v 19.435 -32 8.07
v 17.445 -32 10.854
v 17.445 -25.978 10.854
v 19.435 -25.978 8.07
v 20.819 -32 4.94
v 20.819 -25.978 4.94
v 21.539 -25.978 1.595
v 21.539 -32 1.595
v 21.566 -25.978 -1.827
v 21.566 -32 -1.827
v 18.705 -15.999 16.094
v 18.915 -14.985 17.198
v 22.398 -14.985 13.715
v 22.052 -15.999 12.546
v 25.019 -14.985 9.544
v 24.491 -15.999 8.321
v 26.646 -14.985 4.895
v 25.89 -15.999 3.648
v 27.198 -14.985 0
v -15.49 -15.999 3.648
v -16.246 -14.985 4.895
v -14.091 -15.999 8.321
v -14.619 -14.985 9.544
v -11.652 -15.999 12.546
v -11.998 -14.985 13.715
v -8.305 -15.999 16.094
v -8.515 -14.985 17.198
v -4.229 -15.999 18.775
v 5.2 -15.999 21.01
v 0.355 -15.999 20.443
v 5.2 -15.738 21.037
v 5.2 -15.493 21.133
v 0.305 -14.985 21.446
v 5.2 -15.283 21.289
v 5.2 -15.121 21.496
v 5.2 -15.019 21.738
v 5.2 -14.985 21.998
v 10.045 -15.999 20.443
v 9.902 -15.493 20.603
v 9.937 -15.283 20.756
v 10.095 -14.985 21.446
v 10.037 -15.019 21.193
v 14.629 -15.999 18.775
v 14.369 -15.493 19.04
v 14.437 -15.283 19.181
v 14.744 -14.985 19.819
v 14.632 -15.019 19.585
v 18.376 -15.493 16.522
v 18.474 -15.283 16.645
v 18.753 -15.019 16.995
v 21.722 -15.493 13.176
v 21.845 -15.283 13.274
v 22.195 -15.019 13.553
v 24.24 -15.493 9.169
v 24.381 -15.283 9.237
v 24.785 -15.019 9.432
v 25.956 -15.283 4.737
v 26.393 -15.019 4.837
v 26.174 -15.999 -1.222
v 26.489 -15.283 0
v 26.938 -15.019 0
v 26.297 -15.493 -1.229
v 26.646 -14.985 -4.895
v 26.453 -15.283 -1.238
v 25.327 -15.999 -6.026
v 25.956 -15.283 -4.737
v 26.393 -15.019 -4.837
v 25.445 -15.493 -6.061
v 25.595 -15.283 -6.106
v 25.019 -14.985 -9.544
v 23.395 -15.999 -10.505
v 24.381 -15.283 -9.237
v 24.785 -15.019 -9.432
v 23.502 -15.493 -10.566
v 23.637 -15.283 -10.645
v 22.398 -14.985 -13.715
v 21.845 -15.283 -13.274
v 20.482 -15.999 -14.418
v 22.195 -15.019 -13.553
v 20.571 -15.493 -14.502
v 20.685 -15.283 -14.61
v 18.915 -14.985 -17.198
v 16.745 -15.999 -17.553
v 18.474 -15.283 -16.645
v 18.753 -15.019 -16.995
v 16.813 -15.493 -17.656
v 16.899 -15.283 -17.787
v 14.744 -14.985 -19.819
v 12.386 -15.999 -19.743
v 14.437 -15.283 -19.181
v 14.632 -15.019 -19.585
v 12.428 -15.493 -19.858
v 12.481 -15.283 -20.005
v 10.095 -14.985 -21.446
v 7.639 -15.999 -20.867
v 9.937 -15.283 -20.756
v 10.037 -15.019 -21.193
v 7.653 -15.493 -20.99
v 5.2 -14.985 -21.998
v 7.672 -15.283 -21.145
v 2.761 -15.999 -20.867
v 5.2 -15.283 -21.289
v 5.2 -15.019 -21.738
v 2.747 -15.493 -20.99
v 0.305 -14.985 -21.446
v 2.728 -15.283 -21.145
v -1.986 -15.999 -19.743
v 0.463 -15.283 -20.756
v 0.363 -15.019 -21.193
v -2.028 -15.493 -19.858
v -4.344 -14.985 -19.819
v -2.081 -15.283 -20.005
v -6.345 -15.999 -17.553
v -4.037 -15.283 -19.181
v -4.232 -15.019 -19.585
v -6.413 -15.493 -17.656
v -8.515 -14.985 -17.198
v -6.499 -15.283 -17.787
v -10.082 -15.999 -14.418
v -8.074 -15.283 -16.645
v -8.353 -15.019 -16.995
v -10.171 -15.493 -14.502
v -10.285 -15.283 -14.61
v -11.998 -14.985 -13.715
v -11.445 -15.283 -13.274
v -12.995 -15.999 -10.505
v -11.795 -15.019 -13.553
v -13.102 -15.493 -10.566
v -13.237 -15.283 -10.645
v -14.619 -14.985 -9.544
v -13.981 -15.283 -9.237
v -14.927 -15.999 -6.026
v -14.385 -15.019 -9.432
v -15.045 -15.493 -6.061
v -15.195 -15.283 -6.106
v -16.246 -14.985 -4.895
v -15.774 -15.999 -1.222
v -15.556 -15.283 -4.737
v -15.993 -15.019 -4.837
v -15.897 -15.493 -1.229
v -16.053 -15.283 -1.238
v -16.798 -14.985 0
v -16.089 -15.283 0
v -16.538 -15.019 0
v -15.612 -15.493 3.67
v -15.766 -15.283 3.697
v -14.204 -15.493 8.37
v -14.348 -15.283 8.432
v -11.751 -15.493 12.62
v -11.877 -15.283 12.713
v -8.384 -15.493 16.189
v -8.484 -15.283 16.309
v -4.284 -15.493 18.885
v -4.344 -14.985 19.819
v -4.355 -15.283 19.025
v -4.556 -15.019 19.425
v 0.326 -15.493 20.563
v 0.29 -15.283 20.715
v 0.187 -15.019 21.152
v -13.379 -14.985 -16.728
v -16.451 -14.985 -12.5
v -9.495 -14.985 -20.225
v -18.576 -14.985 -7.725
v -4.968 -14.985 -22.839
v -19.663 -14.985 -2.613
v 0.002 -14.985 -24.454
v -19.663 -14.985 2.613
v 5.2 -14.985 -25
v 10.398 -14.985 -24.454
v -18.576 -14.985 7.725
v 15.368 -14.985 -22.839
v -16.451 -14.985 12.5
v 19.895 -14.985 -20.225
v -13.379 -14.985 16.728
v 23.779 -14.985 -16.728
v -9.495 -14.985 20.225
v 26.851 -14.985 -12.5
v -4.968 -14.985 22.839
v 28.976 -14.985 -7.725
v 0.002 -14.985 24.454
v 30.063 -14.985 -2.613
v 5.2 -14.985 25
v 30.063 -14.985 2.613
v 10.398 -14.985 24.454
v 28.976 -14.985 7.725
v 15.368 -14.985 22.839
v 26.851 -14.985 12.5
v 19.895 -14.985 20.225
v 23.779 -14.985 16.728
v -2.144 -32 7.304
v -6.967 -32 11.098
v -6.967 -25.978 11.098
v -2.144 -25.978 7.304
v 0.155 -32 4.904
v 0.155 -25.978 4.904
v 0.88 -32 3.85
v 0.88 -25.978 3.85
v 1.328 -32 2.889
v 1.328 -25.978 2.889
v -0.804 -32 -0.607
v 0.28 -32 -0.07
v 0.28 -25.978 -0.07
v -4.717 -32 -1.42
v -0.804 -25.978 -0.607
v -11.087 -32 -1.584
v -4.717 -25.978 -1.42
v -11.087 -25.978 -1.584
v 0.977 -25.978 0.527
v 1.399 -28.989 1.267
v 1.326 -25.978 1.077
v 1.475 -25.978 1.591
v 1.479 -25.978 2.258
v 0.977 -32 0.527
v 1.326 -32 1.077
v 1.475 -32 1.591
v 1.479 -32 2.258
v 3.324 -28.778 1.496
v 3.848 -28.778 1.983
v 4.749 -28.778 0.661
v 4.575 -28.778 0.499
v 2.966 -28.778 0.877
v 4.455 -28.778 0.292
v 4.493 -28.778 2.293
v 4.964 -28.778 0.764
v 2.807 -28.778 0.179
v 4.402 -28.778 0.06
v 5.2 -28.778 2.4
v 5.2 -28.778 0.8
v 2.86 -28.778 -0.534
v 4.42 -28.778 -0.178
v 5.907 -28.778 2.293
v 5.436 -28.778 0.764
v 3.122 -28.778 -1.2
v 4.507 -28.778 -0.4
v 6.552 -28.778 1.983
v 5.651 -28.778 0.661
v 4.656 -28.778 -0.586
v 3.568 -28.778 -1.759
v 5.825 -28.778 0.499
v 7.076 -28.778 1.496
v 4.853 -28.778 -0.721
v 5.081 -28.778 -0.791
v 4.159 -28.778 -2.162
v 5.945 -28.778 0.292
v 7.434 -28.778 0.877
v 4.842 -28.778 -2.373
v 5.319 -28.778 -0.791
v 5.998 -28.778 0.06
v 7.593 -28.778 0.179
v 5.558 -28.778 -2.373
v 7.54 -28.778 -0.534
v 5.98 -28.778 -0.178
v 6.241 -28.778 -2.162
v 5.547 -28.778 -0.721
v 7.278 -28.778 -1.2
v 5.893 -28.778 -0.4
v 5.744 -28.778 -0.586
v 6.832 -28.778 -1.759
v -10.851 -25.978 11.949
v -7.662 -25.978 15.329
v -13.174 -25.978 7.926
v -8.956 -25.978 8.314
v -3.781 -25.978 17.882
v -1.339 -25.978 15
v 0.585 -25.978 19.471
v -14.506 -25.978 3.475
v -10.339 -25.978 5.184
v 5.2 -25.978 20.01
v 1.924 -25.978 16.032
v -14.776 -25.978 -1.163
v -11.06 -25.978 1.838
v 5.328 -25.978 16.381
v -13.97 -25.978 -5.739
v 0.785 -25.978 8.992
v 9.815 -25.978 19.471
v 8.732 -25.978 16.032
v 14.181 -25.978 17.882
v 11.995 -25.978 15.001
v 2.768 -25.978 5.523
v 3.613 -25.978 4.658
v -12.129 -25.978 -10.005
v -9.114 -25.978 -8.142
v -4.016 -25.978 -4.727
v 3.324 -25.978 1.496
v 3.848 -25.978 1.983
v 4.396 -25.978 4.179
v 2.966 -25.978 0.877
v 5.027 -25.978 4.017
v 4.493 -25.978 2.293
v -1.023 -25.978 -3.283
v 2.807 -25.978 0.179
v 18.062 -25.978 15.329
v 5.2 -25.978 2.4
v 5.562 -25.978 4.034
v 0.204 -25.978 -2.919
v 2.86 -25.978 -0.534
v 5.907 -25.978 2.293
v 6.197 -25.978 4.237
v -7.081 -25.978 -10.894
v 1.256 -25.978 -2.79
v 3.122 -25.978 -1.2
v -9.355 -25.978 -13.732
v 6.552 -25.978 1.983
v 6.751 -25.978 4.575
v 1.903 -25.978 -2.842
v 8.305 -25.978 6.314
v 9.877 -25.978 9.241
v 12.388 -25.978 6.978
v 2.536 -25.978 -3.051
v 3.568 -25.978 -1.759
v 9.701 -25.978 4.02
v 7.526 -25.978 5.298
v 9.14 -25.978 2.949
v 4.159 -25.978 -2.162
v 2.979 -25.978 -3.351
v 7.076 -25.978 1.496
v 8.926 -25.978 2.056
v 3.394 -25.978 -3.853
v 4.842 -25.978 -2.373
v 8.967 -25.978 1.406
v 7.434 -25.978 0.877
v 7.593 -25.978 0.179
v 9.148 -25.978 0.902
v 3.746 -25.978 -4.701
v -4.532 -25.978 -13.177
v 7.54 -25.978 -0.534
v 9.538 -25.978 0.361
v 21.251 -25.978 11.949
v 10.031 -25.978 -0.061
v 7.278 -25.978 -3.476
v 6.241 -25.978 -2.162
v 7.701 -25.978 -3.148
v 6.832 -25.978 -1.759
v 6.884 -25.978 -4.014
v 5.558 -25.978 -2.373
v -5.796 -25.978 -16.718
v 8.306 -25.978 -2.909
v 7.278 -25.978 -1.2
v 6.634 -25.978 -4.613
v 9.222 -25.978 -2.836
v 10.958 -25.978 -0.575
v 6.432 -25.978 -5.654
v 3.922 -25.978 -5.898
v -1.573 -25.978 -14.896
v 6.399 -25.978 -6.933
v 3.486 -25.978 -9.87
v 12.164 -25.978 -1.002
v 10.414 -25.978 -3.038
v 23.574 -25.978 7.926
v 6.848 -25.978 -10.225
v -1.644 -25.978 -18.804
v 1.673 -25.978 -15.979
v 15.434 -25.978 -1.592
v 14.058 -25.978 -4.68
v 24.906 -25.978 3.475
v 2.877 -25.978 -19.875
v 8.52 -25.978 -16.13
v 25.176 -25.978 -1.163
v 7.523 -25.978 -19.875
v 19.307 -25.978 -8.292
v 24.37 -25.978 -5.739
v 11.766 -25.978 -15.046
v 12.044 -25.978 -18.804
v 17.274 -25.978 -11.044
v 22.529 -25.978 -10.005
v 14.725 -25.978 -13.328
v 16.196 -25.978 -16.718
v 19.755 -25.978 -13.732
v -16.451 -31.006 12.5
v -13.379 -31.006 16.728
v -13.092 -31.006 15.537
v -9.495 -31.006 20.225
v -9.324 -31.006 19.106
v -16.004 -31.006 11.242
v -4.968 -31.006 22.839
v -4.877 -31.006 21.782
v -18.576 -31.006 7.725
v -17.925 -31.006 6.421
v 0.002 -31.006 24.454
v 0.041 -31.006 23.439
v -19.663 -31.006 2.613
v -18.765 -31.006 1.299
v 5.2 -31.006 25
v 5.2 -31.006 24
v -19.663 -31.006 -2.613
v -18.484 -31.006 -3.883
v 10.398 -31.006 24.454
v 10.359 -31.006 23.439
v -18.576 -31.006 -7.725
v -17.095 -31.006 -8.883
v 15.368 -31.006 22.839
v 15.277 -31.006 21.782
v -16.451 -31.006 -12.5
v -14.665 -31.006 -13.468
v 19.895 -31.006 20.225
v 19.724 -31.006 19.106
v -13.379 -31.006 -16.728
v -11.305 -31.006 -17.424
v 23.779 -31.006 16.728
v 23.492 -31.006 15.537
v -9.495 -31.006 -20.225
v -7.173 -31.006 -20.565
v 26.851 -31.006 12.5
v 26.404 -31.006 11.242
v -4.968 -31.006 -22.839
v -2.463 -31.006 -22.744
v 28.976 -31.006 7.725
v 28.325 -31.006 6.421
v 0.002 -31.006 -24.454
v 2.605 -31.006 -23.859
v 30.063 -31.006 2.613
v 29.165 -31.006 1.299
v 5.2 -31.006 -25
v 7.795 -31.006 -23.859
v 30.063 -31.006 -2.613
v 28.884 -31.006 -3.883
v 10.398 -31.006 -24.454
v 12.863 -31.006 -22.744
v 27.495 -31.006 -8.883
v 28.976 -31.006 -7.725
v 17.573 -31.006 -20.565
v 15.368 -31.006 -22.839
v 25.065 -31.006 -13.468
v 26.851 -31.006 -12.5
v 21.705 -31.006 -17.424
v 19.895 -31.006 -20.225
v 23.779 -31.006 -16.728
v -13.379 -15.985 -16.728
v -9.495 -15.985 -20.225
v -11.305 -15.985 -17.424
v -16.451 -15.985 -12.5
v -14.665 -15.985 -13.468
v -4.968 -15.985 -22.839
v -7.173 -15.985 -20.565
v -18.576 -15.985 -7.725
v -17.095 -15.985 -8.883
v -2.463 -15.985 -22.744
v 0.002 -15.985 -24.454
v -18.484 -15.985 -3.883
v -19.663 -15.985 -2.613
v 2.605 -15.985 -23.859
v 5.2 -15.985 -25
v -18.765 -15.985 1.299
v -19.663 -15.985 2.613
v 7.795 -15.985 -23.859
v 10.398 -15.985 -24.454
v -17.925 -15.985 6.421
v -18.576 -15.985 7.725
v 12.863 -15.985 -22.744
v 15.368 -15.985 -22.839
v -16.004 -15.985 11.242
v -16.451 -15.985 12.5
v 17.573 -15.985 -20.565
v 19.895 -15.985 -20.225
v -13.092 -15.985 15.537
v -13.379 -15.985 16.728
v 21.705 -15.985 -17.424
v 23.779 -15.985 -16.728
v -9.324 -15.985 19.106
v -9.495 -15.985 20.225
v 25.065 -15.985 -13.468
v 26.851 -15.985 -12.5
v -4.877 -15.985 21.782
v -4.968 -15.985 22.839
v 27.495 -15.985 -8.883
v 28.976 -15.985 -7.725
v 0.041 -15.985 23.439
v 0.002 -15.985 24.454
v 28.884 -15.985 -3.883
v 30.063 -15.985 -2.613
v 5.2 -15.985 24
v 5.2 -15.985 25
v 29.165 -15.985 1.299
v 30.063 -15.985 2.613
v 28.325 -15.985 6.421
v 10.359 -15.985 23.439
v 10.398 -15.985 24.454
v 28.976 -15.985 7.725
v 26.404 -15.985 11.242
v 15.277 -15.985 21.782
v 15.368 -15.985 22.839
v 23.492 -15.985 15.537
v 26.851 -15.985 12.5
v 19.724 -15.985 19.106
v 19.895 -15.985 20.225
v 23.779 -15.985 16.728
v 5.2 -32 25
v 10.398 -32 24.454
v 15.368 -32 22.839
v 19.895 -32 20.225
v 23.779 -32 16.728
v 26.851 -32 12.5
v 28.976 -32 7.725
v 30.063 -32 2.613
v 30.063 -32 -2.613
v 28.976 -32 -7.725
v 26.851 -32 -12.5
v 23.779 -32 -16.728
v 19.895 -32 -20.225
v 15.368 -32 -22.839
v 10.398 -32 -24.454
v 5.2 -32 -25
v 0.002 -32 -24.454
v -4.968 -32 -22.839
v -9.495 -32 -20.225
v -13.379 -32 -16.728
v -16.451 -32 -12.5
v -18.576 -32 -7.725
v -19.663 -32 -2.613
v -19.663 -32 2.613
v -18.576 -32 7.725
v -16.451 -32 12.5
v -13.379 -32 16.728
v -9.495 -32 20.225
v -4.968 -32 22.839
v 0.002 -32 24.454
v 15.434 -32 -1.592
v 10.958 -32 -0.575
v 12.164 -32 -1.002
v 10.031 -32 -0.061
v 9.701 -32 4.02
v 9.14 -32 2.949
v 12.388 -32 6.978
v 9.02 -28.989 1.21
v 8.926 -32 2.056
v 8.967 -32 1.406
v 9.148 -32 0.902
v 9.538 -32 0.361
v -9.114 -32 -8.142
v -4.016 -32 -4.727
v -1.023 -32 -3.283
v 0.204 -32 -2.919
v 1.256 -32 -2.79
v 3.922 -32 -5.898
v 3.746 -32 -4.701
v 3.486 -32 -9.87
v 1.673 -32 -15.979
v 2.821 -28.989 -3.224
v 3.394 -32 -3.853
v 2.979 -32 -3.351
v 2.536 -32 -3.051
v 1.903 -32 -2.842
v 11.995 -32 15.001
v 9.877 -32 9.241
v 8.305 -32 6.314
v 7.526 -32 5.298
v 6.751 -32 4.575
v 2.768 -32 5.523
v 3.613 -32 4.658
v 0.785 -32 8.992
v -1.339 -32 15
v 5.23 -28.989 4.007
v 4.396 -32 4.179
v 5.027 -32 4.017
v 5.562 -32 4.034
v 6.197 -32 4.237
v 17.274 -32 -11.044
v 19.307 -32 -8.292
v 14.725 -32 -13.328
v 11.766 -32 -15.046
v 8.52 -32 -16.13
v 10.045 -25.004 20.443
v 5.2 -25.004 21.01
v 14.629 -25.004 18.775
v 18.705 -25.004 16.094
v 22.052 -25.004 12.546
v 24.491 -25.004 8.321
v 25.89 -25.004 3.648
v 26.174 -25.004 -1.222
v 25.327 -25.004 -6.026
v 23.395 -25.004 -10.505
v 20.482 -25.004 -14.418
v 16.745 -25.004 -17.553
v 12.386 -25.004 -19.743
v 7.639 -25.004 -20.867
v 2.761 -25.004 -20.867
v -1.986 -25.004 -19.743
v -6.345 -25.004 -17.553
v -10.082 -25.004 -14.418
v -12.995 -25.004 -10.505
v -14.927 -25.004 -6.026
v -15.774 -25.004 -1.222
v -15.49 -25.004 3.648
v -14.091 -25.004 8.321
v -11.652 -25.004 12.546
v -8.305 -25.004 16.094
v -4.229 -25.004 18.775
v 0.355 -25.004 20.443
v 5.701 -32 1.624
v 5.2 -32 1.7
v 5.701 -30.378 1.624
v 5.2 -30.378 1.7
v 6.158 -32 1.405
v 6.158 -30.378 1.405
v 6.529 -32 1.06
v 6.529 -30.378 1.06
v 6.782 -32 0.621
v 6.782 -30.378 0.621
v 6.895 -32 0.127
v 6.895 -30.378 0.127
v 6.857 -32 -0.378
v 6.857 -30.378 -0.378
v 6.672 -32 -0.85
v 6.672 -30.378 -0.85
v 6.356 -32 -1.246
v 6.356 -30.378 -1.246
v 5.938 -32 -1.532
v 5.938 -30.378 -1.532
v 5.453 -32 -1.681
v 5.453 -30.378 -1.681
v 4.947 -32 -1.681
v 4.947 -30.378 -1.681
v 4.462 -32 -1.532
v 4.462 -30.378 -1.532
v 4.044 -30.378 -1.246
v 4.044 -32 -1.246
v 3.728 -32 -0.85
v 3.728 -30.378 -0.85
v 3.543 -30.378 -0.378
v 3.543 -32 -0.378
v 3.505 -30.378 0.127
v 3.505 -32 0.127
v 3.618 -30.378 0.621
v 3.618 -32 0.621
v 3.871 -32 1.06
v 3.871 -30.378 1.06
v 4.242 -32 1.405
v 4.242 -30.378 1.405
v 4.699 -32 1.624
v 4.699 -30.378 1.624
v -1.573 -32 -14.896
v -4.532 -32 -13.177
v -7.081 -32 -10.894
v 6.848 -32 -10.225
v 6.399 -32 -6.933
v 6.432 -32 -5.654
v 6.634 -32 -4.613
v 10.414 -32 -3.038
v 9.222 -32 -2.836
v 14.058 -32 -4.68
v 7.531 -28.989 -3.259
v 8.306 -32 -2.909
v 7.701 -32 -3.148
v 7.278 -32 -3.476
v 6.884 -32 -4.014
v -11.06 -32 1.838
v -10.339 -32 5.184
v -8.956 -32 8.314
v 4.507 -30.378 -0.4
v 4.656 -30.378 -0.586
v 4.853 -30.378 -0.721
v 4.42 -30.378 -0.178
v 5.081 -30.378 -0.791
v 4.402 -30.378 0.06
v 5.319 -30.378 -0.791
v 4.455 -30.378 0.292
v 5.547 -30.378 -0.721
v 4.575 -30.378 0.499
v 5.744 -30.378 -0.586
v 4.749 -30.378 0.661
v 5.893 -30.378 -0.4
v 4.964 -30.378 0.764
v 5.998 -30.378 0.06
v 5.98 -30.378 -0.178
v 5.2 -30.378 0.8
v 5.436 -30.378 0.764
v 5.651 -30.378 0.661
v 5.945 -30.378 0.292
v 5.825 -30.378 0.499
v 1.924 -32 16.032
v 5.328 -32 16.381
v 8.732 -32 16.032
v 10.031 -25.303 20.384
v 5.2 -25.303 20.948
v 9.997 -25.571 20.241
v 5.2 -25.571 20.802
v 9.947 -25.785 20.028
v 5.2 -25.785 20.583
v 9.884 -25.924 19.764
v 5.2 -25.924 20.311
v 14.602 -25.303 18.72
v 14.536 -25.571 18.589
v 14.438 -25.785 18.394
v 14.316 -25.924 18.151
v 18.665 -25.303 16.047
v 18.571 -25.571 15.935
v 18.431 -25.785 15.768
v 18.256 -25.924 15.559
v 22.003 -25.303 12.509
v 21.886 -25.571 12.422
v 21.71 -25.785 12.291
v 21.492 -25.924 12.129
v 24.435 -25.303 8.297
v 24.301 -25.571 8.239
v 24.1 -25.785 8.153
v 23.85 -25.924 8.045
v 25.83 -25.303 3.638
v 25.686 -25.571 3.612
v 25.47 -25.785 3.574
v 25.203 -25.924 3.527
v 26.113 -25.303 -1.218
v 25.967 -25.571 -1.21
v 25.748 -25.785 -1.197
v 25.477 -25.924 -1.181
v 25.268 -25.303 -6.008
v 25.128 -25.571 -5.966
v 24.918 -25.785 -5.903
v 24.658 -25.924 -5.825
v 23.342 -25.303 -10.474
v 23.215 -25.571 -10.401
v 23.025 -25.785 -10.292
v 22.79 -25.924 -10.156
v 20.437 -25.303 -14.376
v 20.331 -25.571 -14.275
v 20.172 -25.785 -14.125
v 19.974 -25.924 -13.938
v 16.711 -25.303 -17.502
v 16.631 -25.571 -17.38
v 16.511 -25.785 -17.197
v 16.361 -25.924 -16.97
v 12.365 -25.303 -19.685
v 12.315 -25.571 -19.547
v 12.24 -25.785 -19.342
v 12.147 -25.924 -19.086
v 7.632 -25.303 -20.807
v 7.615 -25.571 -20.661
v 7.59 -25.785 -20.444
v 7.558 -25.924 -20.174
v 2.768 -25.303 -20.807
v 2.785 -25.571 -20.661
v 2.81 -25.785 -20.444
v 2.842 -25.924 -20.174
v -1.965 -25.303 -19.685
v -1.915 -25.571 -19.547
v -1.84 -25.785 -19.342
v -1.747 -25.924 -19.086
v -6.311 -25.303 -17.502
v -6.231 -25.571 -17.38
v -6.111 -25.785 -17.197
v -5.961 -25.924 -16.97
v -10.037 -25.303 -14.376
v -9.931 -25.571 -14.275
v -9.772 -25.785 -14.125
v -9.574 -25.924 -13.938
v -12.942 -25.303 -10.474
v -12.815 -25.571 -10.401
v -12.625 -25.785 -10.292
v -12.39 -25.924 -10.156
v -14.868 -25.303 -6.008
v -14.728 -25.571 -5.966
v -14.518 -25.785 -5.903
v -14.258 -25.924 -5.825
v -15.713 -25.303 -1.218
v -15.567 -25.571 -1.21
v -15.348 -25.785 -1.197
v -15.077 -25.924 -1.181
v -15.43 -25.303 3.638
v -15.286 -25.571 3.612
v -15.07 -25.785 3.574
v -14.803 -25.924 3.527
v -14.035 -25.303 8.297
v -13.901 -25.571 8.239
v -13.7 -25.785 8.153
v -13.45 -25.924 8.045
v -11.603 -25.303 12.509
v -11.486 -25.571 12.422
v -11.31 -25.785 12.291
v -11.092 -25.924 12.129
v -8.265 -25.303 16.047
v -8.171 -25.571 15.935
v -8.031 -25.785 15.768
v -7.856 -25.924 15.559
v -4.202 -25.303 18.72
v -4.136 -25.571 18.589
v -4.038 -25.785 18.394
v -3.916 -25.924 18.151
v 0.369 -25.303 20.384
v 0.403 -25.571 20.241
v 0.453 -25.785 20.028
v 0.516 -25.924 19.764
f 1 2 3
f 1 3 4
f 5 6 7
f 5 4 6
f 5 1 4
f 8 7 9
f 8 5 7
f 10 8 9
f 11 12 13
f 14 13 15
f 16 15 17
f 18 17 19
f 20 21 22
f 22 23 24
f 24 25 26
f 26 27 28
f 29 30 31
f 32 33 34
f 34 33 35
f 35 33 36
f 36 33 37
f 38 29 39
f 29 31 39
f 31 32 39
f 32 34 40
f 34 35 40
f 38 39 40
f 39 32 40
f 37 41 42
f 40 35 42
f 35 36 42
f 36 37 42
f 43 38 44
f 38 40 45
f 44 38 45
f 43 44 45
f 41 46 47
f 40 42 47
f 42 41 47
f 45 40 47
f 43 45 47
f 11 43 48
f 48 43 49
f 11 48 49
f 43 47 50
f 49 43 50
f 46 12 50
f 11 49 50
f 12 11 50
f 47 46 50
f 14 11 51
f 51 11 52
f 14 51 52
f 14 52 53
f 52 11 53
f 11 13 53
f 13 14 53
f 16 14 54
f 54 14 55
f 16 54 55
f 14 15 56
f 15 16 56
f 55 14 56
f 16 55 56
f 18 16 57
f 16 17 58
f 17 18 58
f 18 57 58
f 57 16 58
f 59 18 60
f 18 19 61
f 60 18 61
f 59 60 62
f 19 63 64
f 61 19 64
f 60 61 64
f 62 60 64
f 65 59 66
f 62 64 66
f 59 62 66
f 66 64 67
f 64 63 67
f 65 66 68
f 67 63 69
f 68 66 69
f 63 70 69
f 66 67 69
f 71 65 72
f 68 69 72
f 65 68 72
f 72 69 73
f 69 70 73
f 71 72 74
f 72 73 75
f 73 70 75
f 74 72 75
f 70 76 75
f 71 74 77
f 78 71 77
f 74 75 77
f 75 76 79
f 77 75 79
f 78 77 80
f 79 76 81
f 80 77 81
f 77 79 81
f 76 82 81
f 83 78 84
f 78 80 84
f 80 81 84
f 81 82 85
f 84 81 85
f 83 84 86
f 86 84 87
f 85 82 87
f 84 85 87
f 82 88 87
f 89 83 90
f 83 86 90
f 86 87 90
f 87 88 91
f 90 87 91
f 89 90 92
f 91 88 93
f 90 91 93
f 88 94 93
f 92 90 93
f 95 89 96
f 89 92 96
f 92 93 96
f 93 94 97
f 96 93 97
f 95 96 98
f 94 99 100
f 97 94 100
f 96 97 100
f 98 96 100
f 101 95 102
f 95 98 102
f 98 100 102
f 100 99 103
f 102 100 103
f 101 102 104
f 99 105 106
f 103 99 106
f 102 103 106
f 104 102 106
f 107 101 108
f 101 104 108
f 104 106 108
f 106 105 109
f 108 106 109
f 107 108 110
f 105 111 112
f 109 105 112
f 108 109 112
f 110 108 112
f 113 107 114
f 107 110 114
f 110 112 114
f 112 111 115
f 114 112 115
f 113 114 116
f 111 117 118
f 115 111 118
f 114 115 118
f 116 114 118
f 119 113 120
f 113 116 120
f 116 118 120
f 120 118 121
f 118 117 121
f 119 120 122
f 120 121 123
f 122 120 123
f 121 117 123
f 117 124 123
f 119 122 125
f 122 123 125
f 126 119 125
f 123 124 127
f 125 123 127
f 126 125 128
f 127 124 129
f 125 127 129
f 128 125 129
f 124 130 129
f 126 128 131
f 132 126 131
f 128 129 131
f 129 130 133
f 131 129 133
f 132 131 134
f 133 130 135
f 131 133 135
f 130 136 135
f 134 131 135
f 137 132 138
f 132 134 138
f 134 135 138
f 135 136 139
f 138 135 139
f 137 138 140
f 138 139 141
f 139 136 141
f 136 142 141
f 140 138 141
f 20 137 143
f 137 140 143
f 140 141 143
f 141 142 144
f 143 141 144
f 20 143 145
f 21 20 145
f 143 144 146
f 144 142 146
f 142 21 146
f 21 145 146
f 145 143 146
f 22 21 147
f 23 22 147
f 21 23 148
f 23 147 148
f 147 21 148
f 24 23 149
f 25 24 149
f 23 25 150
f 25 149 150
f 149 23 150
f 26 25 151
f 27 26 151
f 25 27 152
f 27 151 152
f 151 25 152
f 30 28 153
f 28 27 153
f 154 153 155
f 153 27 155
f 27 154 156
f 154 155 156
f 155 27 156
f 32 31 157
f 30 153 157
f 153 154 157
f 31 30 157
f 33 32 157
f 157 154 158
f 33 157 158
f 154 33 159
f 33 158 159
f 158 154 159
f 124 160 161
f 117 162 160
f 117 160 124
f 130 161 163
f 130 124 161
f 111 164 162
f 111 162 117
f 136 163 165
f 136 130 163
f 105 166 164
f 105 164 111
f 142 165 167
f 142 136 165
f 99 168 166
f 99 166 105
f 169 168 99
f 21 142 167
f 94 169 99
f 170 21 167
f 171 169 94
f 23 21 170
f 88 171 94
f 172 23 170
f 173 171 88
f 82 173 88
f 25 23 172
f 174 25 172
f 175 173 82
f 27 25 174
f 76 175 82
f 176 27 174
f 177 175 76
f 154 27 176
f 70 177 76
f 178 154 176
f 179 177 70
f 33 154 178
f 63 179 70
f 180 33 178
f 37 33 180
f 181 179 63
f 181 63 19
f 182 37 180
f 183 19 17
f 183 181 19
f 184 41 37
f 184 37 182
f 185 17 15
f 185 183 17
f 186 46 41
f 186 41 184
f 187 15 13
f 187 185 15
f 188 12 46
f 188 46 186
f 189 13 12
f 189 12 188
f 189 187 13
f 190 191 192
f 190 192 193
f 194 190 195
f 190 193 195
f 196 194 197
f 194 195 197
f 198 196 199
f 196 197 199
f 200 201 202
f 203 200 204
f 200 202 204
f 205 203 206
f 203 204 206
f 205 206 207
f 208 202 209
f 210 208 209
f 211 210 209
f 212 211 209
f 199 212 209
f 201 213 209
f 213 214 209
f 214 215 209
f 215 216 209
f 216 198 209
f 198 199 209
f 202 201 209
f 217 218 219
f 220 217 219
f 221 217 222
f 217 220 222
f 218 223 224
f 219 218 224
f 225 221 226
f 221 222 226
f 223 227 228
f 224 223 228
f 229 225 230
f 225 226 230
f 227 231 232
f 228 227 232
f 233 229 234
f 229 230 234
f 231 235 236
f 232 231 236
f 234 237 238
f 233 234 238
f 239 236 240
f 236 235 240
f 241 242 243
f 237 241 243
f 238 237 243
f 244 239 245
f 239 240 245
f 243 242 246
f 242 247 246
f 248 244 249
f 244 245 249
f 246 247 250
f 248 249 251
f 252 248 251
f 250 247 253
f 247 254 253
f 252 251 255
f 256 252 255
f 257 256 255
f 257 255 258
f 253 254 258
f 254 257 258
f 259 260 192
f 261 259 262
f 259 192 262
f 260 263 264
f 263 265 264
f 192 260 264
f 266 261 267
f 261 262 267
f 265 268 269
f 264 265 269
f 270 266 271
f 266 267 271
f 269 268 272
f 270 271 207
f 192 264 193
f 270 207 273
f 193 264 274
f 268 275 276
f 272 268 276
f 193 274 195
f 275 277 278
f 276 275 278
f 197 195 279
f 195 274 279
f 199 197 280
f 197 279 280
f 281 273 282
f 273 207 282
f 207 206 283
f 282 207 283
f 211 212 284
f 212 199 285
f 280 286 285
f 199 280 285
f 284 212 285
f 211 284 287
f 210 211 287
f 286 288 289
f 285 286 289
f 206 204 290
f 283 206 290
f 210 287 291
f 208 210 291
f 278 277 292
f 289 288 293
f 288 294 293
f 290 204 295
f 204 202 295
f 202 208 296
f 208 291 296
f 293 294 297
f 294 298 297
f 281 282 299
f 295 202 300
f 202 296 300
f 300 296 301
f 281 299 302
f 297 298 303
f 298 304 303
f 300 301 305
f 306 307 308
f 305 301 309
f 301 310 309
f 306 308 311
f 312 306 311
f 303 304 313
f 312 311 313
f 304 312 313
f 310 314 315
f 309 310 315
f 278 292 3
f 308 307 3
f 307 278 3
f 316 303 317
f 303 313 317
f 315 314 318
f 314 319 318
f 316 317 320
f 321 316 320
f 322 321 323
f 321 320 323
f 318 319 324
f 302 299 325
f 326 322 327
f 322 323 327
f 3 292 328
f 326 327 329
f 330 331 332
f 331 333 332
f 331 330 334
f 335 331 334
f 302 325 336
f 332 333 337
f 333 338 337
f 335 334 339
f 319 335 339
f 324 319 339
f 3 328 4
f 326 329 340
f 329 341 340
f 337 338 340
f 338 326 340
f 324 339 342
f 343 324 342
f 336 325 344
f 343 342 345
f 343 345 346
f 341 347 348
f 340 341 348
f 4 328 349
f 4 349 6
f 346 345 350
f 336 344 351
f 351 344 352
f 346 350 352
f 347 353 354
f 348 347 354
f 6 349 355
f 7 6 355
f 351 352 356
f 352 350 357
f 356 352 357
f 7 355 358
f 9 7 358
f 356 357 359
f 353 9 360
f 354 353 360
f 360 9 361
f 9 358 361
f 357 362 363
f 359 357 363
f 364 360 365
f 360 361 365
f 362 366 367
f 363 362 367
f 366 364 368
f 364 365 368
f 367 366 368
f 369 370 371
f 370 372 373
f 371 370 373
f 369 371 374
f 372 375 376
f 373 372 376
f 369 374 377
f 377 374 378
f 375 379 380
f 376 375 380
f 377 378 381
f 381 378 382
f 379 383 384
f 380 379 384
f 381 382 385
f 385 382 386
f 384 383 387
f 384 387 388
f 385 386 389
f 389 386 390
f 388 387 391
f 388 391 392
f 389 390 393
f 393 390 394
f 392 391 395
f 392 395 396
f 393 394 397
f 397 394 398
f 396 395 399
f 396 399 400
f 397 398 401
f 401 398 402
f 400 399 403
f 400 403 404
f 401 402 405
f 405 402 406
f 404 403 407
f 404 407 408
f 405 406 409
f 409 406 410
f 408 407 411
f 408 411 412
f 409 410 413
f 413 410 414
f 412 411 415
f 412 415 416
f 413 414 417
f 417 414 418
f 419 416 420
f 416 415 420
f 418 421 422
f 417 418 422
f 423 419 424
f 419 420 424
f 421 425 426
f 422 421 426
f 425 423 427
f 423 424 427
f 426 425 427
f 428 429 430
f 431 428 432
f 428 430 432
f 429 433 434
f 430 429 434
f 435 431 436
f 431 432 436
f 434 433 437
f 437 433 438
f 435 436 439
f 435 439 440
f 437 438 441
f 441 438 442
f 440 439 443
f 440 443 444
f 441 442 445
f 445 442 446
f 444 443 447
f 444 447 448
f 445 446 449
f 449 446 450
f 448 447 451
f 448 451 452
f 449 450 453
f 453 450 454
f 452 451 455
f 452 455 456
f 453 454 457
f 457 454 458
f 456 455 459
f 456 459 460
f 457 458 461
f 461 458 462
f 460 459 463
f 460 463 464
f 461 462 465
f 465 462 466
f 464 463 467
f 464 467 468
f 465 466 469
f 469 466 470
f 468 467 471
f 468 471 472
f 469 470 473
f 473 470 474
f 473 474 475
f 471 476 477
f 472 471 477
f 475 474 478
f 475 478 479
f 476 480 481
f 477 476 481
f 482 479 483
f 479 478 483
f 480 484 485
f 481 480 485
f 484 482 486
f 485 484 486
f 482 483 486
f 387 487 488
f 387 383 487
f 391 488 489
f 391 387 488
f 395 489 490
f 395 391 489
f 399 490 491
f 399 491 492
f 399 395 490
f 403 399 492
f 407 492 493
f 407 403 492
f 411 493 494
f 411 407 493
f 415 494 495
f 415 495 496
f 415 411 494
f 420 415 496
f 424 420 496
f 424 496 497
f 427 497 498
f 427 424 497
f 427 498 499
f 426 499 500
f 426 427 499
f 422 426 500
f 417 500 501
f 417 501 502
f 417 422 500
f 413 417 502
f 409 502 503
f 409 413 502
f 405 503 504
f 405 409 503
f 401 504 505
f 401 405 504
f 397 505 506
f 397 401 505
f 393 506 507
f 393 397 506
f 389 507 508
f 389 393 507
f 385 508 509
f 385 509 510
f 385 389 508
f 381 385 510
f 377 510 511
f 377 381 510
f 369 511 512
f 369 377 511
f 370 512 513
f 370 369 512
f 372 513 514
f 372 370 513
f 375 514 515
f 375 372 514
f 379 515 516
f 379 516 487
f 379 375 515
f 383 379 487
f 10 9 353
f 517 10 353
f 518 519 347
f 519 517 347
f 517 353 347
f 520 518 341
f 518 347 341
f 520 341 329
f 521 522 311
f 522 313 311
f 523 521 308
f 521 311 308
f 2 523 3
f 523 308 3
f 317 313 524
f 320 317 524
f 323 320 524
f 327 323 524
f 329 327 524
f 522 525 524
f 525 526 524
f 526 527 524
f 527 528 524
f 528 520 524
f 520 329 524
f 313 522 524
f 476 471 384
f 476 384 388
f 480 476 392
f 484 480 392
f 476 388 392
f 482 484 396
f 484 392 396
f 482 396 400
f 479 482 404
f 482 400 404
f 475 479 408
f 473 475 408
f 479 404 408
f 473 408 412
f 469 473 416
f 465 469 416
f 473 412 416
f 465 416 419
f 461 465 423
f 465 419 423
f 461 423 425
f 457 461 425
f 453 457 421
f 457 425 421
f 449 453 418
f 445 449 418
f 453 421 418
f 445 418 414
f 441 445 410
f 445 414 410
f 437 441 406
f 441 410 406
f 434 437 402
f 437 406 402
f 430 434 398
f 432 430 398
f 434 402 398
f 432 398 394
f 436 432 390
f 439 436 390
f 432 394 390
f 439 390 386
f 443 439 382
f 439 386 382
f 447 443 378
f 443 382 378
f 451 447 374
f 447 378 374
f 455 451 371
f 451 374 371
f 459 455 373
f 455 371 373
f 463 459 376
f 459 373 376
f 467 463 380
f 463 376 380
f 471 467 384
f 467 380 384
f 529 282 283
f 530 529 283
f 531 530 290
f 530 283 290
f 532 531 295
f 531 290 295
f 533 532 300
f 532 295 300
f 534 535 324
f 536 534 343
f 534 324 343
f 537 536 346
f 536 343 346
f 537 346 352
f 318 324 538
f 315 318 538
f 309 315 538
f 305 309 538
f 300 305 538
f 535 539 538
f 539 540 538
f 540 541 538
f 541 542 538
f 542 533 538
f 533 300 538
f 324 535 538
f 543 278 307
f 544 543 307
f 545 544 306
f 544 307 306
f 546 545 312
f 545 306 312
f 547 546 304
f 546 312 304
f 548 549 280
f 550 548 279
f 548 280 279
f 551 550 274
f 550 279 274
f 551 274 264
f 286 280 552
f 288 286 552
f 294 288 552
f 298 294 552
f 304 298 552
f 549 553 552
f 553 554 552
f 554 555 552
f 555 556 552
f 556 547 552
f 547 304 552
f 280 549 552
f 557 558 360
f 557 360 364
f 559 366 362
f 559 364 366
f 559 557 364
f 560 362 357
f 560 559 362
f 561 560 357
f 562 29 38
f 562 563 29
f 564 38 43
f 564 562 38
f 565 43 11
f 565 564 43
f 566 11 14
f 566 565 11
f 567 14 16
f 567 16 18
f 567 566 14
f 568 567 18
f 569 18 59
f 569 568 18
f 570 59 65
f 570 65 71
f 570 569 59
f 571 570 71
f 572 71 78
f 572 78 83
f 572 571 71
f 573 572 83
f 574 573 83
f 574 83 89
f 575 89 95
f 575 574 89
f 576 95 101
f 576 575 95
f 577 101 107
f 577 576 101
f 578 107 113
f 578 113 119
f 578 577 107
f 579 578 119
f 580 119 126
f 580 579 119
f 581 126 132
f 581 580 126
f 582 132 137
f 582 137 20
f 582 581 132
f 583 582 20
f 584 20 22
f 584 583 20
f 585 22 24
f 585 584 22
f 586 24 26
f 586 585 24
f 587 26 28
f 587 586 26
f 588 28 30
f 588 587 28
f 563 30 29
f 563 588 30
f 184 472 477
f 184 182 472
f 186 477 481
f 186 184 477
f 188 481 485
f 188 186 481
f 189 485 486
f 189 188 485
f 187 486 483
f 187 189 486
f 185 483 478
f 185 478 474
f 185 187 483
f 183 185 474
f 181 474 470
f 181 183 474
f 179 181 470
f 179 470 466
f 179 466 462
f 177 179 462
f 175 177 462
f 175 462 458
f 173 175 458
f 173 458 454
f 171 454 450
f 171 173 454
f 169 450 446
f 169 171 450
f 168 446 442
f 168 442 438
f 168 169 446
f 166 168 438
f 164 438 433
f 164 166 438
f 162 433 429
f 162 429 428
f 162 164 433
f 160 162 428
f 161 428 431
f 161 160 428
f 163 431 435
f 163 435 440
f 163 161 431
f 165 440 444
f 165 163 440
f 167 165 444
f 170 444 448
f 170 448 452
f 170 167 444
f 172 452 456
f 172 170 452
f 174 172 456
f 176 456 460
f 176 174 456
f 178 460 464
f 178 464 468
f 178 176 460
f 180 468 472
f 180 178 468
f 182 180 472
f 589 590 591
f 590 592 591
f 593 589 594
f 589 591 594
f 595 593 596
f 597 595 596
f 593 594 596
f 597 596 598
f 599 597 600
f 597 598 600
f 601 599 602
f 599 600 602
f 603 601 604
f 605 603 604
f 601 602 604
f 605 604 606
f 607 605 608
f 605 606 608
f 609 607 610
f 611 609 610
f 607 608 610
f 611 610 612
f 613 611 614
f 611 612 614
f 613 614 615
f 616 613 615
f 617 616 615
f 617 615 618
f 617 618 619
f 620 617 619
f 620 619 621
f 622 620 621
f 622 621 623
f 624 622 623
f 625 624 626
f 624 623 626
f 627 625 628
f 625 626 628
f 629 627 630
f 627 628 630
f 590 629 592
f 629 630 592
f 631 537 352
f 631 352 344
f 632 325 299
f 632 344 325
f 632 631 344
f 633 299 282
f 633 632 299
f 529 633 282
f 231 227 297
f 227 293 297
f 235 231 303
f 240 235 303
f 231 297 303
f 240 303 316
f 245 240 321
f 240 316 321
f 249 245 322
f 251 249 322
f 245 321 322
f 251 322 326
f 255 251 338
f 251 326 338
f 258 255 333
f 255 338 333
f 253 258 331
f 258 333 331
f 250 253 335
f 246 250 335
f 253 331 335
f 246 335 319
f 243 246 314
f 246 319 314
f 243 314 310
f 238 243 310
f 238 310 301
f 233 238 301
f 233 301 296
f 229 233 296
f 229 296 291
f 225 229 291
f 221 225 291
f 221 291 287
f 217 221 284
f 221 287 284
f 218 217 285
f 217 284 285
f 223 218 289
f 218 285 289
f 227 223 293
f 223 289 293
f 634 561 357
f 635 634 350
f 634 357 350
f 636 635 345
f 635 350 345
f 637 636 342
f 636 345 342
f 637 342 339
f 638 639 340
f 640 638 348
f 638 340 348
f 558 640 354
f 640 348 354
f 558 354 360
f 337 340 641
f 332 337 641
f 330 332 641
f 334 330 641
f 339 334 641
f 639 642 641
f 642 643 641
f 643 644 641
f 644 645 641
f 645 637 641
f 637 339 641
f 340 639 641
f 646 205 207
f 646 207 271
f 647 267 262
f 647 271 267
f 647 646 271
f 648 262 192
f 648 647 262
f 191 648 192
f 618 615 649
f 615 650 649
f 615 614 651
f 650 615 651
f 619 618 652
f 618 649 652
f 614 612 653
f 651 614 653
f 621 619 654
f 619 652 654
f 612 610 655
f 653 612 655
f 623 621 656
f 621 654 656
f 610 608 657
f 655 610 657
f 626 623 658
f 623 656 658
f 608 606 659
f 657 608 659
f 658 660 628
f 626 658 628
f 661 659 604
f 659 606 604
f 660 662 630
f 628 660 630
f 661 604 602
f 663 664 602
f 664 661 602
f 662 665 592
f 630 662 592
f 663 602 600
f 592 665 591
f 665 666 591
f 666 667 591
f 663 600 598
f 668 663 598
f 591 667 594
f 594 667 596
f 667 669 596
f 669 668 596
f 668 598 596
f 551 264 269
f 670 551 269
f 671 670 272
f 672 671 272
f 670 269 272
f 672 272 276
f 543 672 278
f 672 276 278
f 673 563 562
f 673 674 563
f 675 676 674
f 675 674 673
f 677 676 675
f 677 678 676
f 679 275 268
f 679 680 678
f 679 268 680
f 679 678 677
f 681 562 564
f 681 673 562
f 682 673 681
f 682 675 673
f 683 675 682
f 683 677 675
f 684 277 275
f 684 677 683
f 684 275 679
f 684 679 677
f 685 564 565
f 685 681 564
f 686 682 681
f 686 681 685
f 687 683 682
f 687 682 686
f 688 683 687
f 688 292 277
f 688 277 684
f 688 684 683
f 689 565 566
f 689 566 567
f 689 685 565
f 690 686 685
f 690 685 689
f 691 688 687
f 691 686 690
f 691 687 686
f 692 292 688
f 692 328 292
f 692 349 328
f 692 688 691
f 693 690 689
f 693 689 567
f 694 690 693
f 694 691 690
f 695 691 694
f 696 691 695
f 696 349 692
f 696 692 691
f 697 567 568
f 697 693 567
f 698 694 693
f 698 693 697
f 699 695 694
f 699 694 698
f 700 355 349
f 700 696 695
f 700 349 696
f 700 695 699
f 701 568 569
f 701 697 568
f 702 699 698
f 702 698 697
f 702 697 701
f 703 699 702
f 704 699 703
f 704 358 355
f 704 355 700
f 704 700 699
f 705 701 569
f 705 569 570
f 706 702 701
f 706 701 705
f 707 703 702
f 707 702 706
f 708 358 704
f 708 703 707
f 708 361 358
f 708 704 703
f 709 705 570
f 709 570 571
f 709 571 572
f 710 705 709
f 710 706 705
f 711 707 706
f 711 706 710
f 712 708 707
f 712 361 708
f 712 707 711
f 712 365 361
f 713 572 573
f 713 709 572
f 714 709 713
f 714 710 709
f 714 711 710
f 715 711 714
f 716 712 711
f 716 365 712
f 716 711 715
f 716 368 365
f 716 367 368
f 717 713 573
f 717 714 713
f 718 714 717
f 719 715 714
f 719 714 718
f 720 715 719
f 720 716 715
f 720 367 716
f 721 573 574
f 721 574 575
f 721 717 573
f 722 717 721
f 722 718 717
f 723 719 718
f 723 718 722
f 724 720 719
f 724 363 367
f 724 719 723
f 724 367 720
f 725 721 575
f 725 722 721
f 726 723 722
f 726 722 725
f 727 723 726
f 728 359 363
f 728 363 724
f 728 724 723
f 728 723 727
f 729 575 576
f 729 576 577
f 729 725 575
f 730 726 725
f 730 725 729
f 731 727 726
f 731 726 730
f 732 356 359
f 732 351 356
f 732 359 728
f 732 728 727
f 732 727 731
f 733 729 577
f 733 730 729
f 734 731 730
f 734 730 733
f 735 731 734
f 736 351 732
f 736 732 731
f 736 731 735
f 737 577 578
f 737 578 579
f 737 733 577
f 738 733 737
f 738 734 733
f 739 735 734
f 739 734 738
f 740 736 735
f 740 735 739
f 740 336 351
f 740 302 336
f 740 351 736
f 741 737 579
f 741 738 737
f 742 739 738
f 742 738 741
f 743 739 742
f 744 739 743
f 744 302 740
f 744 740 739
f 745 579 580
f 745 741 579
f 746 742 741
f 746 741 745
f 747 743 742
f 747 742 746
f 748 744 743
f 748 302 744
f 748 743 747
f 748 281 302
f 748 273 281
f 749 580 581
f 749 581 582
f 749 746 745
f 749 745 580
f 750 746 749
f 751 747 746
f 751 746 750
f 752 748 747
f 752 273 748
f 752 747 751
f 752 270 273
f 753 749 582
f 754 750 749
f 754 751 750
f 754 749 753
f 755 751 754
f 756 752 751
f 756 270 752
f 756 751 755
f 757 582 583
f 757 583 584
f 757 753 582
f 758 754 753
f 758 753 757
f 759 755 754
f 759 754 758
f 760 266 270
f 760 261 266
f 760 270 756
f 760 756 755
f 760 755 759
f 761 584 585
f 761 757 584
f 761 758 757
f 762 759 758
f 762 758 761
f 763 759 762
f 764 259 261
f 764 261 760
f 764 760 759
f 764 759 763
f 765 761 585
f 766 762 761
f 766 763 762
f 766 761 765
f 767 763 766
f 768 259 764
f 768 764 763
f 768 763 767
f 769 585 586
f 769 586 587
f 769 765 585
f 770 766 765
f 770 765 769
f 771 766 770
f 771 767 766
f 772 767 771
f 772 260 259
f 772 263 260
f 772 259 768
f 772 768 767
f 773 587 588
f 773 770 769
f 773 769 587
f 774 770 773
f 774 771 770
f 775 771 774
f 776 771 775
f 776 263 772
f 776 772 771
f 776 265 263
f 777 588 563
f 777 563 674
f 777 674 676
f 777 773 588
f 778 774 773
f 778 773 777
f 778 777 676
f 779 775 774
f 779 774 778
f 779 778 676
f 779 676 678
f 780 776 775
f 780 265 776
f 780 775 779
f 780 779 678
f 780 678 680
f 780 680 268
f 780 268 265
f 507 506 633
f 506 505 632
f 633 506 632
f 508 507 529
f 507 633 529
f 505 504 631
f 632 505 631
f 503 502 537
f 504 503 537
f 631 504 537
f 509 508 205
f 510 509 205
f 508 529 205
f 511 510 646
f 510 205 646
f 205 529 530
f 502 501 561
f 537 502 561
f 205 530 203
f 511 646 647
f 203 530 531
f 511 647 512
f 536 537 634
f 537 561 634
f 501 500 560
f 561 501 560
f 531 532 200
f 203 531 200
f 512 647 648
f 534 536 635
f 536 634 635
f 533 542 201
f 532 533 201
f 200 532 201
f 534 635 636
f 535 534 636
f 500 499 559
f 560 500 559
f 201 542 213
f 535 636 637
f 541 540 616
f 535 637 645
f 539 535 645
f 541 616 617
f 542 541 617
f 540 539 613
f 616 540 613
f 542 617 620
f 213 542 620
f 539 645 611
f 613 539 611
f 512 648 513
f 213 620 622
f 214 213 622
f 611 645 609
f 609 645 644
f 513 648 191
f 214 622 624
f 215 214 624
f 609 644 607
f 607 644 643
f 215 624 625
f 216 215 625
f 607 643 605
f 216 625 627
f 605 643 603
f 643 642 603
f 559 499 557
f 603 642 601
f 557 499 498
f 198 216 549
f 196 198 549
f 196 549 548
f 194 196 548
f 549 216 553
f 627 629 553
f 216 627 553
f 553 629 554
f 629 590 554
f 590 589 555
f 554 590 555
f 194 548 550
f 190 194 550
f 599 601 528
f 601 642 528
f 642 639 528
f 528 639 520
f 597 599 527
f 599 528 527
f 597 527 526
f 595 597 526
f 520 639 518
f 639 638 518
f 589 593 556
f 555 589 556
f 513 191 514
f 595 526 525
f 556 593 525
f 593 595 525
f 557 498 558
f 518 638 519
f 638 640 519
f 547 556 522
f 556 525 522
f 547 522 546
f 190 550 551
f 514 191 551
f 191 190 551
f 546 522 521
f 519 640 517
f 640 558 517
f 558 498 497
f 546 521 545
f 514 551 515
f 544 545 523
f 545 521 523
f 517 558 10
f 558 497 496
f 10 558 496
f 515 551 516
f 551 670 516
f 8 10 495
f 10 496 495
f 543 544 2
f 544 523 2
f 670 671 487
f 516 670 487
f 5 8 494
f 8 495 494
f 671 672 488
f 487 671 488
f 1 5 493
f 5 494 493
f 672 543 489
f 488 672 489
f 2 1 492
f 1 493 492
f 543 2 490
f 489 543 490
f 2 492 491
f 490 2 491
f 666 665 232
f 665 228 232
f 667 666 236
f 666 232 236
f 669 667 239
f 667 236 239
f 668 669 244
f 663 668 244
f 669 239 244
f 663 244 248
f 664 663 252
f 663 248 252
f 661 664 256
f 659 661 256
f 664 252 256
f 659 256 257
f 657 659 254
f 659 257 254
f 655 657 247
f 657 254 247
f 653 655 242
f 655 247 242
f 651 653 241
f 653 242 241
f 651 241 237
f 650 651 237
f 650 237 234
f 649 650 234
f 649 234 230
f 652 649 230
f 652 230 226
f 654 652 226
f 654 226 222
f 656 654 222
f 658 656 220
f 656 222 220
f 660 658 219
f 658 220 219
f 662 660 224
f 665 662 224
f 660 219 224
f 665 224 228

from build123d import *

# Parameters (mm, degrees)
POCKET_DEPTH       = 145.459123
POCKET_DEPTH_BACK  = 177.459123
POLARPATTERN_COUNT = 5


with BuildPart() as part:
    # Sketch009 → Revolution (revolve)
    with BuildSketch(Plane.YZ):
        with BuildLine():
            Line((-32, 25), (-31.006334, 25))
            Line((-31.006334, 24), (-31.006334, 25))
            Line((-15.98482, 24), (-31.006334, 24))
            Line((-15.98482, 25), (-15.98482, 24))
            Line((-15.98482, 25), (-14.98482, 25))
            Line((-14.98482, 25), (-14.98482, 21.997654))
            ThreePointArc((-15.998639, 21.00955), (-15.282862, 21.289299), (-14.98482, 21.997654))
            Line((-15.998639, 21.00955), (-25.00382, 21.00955))
            ThreePointArc((-25.00382, 21.00955), (-25.68626, 20.700427), (-25.977919, 20.010342))
            Line((-25.977919, 2.4), (-25.977919, 20.010342))
            Line((-28.777919, 2.4), (-25.977919, 2.4))
            Line((-28.777919, 0.8), (-28.777919, 2.4))
            Line((-30.377919, 0.8), (-28.777919, 0.8))
            Line((-30.377919, 1.7), (-30.377919, 0.8))
            Line((-32, 1.7), (-30.377919, 1.7))
            Line((-32, 25), (-32, 1.7))
        make_face()
    revolve(axis=Axis((0, 0, 0), (0, 1, 0)))

    # Sketch010 → Pocket (cut, two sides)
    with BuildSketch(Plane(origin=(-5.2, 0, 0), x_dir=(1, 0, 0), z_dir=(0, -1, 0))) as pocket_sk:
        with BuildLine():
            add(Edge.make_bspline(
                [(11.995053, 15.000581), (5.131915, -6.987182), (-1.338915, 15.000254)],
                knots=[-6.684799, -6.684799, -6.684799, 6.648635, 6.648635, 6.648635], degree=2))
            ThreePointArc((-1.338915, 15.000254), (5.328035, 16.380749), (11.995053, 15.000581))
        make_face()
    pocket = extrude(amount=-POCKET_DEPTH, mode=Mode.SUBTRACT) + extrude(pocket_sk.sketch, amount=POCKET_DEPTH_BACK, mode=Mode.SUBTRACT)

    # PolarPattern: Pocket ×5 about axis
    polarpattern_axis = Axis((0, 0, 0), (0, 1, 0))
    for i in range(1, POLARPATTERN_COUNT):
        add(pocket.rotate(polarpattern_axis, i * 360 / POLARPATTERN_COUNT), mode=Mode.SUBTRACT)


with BuildPart() as part_1:
    # Body007 placement: moved
    add(part.part.moved(Location((5.2, 0, 0))))


solid = part_1.part
